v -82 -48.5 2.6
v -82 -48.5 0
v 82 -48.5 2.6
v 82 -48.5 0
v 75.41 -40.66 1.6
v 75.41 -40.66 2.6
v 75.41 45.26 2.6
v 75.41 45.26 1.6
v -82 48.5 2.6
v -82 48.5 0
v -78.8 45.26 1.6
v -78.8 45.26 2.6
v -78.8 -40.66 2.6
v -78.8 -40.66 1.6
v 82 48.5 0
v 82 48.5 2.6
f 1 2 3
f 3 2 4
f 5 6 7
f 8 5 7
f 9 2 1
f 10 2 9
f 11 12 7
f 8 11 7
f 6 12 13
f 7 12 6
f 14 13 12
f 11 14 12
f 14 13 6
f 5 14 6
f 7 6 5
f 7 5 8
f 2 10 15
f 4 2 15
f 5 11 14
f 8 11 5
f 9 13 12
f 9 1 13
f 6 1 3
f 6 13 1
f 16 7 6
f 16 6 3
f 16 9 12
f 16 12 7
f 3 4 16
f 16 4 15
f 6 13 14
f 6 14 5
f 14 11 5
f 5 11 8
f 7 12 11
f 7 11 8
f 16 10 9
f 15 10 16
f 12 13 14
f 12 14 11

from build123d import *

# Parameters (mm, degrees)
SKETCH1_W           = 164
SKETCH1_H           = 97
BOSS_EXTRUDE1_DEPTH = 2.6
SKETCH2_W           = 154.21
SKETCH2_H           = 85.92
CUT_EXTRUDE1_DEPTH  = 1
BOSS_EXTRUDE3_REACH = 97.305
SKETCH3_W           = 154.21
SKETCH3_H           = 85.92


with BuildPart() as part:
    # Sketch1 → Boss-Extrude1 (new body)
    with BuildSketch(Plane.XY):
        Rectangle(SKETCH1_W, SKETCH1_H)
    extrude(amount=BOSS_EXTRUDE1_DEPTH)

    # Sketch2 → Cut-Extrude1 (cut)
    with BuildSketch(Plane.XY.offset(2.6)):
        with Locations((-1.695, 2.3)):
            Rectangle(SKETCH2_W, SKETCH2_H)
    extrude(amount=-CUT_EXTRUDE1_DEPTH, mode=Mode.SUBTRACT)


with BuildPart() as body_2:

    # Sketch3 → Boss-Extrude3 (new, up to next)
    with BuildSketch(Plane.XY.offset(2.6), mode=Mode.PRIVATE) as boss_extrude3_sk1:
        with Locations((-1.695, 2.3)):
            Rectangle(SKETCH3_W, SKETCH3_H)
    boss_extrude3_tool1 = extrude(boss_extrude3_sk1.sketch, amount=-BOSS_EXTRUDE3_REACH, mode=Mode.PRIVATE) - part.part
    add(boss_extrude3_tool1.solids().sort_by_distance((-1.695, 2.3, 2.6))[0])


solid = Compound([part.part, body_2.part])
